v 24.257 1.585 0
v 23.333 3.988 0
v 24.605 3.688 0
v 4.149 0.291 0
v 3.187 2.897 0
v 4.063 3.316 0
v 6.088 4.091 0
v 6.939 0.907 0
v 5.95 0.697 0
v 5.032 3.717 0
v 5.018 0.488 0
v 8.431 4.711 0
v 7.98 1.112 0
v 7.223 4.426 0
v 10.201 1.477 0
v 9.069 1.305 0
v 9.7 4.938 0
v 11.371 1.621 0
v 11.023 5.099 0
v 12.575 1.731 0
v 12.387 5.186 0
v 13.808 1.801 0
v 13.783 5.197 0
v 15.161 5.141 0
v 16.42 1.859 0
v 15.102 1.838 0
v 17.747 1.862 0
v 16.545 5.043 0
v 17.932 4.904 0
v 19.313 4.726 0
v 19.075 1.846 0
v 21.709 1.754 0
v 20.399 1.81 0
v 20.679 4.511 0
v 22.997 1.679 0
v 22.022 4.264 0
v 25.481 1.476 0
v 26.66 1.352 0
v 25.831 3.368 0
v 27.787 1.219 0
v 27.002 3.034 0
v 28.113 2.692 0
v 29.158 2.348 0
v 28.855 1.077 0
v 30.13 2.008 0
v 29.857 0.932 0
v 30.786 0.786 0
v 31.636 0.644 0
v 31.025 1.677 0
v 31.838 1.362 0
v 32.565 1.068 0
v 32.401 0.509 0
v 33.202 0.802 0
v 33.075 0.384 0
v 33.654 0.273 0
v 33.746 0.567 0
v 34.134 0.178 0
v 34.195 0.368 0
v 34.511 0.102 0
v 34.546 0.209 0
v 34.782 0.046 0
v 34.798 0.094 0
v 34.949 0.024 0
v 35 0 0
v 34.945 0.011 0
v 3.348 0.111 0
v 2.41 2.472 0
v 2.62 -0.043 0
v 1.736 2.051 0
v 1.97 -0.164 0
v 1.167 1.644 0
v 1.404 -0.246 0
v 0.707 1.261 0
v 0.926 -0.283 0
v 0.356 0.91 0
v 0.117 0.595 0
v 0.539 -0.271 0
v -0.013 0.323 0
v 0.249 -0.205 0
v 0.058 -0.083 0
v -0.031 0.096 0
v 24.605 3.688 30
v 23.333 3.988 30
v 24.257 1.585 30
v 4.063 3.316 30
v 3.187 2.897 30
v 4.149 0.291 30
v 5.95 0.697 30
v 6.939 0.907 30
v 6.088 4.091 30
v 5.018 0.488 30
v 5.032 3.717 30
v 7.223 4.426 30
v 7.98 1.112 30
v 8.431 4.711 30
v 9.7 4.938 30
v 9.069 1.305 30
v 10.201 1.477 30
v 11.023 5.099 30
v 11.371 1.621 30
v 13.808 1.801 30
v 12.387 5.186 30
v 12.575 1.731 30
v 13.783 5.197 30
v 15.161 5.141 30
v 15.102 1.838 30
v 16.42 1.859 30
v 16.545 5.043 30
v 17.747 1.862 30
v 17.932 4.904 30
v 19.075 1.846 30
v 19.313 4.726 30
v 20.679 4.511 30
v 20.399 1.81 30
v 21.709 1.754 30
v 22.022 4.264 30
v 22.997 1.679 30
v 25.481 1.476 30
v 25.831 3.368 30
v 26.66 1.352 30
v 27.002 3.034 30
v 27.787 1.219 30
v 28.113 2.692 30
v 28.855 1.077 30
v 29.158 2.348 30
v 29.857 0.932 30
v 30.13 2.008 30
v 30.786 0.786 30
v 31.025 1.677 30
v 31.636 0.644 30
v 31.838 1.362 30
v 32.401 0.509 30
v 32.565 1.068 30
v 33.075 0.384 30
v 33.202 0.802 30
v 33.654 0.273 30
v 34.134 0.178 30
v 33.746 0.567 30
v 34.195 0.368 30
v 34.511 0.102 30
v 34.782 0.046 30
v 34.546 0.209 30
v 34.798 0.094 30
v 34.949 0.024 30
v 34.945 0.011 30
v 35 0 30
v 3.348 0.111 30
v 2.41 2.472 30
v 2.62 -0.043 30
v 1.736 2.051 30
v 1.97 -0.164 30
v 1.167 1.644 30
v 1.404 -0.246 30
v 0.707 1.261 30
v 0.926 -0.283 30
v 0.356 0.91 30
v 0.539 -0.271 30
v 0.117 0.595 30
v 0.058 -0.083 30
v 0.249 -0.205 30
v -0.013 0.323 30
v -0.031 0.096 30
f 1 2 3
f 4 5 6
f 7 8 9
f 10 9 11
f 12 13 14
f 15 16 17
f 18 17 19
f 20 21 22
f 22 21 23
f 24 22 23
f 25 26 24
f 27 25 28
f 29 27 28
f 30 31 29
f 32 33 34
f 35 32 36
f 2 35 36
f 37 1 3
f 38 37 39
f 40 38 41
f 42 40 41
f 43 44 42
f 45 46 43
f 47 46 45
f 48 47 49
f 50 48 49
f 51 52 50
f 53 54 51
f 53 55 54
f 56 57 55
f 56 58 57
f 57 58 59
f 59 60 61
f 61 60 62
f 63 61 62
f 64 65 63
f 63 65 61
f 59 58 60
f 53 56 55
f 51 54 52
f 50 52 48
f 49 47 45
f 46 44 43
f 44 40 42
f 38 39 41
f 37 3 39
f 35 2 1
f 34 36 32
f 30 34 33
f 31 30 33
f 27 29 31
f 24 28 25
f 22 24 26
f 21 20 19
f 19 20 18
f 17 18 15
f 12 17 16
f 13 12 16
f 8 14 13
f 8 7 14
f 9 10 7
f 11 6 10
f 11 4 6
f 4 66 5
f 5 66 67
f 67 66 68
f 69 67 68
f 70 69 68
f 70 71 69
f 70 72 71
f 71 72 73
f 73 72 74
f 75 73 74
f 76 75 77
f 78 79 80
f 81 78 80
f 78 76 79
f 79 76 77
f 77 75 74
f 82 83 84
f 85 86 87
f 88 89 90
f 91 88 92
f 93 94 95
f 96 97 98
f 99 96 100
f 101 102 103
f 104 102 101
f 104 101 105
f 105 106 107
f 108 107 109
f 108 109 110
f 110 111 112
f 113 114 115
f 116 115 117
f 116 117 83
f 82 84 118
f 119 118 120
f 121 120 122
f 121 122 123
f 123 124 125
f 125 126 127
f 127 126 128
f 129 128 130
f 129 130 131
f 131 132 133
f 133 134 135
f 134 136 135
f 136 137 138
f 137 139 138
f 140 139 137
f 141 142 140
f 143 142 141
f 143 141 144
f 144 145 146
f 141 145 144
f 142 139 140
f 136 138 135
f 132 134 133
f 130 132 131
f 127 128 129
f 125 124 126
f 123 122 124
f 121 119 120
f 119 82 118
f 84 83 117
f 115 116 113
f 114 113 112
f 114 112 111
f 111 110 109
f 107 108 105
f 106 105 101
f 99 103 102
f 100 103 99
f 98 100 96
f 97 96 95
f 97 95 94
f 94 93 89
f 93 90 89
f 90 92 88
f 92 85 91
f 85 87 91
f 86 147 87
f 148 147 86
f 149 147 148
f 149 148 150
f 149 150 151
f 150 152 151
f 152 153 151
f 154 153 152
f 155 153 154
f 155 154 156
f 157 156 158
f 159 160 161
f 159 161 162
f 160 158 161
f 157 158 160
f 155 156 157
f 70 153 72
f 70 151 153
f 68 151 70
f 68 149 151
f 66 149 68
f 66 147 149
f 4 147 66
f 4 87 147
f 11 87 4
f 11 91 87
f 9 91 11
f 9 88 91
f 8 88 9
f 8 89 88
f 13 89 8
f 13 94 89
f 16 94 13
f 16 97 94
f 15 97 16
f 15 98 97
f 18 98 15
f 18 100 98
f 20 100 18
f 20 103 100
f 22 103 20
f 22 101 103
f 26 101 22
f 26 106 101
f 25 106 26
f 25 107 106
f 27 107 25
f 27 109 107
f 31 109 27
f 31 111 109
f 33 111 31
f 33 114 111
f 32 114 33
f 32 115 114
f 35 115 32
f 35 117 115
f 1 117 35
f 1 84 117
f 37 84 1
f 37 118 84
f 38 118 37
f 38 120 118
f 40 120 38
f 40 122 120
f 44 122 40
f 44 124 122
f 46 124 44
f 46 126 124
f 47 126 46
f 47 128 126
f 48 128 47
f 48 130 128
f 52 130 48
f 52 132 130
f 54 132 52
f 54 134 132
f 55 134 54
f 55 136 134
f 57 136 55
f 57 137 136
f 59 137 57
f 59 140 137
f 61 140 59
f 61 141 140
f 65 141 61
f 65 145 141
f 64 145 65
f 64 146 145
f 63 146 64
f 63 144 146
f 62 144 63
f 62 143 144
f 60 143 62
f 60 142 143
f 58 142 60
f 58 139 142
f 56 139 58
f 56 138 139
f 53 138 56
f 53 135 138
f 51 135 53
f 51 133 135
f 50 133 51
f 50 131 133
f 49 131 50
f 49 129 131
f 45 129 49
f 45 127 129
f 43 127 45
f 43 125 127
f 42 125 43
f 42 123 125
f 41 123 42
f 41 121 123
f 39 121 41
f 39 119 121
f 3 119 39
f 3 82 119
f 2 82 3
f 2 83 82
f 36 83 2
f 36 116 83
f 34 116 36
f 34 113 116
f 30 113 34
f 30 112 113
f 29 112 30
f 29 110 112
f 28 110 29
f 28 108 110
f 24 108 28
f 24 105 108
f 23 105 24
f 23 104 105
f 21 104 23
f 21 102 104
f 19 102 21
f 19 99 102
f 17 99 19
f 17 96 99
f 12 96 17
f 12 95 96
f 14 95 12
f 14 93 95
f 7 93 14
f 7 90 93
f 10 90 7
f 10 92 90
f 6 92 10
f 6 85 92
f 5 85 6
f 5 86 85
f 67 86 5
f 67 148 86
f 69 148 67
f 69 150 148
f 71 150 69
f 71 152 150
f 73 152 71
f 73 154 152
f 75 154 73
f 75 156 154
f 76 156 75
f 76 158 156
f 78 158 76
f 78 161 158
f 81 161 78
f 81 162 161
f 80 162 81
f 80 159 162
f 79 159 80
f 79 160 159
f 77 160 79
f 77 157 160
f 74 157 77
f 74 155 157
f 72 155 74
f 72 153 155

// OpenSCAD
// Naca4.scad - library for parametric airfoils of 4 digit NACA series
// Code: Rudolf Huttary, Berlin 
// June 2015
// commercial use prohibited


// general use: for more examples refer to sampler.scad
// naca = naca digits or 3el vector  (default = 12 or [0, 0, .12])
// L    = chord length [mm]      (default= 100)
// N    = # sample points        (default= 81)
// h    = height [mm]            (default= 1)
// open = close at the thin end? (default = true)
// two equivalent example calls
 airfoil(naca = 1410, L = 35, N=81, h = 30, open = false); 
// airfoil(naca = [.2, .4, .32], L = 60, N=1001, h = 30, open = false); 

module help()
{
  echo(str("\n\nList of signatures in lib:\n=================\n", 
  "module airfoil(naca=2412, L = 100, N = 81, h = 1, open = false) - renders airfoil object\n", 
  "module airfoil(naca=[.2, .4, .12], L = 100, N = 81, h = 1, open = false) - renders airfoil object using percentage for camber,  camber distance and thicknes\n", 
  "function airfoil_data(naca=12, L = 100, N = 81, open = false)\n",
  "=================\n")); 
}

help(); 
// this is the object
module airfoil(naca=12, L = 100, N = 81, h = 1, open = false)
{
  linear_extrude(height = h)
  polygon(points = airfoil_data(naca, L, N, open)); 
}

// this is the main function providing the airfoil data
function airfoil_data(naca=12, L = 100, N = 81, open = false) = 
  let(Na = len(naca)!=3?NACA(naca):naca)
  let(A = [.2969, -0.126, -.3516, .2843, open?-0.1015:-0.1036])
  [for (b=[-180:360/(N):179.99]) 
    let (x = (1-cos(b))/2)  
    let(yt = sign(b)*Na[2]/.2*(A*[sqrt(x), x, x*x, x*x*x, x*x*x*x])) 
    Na[0]==0?L*[x, yt]:L*camber(x, yt, Na[0], Na[1], sign(b))];  

// helper functions
function NACA(naca) = 
  let (M = floor(naca/1000))
  let (P = floor((naca-M*1000)/100)) 
  [M/10, P/10, floor(naca-M*1000-P*100)/100];  

function camber(x, y, M, P, upper) = 
  let(yc = (x<P)?M/P/P*(2*P*x-x*x): M/(1-P)/(1-P)*(1 - 2*P + 2*P*x -x*x))
  let(dy = (x<P)?2*M/P/P*(P-x):2*M/(1-P)/(1-P)*(P-x))
  let(th = atan(dy))
  [upper ? x - y*sin(th):x + y*sin(th), upper ? yc + y*cos(th):yc - y*cos(th)];
